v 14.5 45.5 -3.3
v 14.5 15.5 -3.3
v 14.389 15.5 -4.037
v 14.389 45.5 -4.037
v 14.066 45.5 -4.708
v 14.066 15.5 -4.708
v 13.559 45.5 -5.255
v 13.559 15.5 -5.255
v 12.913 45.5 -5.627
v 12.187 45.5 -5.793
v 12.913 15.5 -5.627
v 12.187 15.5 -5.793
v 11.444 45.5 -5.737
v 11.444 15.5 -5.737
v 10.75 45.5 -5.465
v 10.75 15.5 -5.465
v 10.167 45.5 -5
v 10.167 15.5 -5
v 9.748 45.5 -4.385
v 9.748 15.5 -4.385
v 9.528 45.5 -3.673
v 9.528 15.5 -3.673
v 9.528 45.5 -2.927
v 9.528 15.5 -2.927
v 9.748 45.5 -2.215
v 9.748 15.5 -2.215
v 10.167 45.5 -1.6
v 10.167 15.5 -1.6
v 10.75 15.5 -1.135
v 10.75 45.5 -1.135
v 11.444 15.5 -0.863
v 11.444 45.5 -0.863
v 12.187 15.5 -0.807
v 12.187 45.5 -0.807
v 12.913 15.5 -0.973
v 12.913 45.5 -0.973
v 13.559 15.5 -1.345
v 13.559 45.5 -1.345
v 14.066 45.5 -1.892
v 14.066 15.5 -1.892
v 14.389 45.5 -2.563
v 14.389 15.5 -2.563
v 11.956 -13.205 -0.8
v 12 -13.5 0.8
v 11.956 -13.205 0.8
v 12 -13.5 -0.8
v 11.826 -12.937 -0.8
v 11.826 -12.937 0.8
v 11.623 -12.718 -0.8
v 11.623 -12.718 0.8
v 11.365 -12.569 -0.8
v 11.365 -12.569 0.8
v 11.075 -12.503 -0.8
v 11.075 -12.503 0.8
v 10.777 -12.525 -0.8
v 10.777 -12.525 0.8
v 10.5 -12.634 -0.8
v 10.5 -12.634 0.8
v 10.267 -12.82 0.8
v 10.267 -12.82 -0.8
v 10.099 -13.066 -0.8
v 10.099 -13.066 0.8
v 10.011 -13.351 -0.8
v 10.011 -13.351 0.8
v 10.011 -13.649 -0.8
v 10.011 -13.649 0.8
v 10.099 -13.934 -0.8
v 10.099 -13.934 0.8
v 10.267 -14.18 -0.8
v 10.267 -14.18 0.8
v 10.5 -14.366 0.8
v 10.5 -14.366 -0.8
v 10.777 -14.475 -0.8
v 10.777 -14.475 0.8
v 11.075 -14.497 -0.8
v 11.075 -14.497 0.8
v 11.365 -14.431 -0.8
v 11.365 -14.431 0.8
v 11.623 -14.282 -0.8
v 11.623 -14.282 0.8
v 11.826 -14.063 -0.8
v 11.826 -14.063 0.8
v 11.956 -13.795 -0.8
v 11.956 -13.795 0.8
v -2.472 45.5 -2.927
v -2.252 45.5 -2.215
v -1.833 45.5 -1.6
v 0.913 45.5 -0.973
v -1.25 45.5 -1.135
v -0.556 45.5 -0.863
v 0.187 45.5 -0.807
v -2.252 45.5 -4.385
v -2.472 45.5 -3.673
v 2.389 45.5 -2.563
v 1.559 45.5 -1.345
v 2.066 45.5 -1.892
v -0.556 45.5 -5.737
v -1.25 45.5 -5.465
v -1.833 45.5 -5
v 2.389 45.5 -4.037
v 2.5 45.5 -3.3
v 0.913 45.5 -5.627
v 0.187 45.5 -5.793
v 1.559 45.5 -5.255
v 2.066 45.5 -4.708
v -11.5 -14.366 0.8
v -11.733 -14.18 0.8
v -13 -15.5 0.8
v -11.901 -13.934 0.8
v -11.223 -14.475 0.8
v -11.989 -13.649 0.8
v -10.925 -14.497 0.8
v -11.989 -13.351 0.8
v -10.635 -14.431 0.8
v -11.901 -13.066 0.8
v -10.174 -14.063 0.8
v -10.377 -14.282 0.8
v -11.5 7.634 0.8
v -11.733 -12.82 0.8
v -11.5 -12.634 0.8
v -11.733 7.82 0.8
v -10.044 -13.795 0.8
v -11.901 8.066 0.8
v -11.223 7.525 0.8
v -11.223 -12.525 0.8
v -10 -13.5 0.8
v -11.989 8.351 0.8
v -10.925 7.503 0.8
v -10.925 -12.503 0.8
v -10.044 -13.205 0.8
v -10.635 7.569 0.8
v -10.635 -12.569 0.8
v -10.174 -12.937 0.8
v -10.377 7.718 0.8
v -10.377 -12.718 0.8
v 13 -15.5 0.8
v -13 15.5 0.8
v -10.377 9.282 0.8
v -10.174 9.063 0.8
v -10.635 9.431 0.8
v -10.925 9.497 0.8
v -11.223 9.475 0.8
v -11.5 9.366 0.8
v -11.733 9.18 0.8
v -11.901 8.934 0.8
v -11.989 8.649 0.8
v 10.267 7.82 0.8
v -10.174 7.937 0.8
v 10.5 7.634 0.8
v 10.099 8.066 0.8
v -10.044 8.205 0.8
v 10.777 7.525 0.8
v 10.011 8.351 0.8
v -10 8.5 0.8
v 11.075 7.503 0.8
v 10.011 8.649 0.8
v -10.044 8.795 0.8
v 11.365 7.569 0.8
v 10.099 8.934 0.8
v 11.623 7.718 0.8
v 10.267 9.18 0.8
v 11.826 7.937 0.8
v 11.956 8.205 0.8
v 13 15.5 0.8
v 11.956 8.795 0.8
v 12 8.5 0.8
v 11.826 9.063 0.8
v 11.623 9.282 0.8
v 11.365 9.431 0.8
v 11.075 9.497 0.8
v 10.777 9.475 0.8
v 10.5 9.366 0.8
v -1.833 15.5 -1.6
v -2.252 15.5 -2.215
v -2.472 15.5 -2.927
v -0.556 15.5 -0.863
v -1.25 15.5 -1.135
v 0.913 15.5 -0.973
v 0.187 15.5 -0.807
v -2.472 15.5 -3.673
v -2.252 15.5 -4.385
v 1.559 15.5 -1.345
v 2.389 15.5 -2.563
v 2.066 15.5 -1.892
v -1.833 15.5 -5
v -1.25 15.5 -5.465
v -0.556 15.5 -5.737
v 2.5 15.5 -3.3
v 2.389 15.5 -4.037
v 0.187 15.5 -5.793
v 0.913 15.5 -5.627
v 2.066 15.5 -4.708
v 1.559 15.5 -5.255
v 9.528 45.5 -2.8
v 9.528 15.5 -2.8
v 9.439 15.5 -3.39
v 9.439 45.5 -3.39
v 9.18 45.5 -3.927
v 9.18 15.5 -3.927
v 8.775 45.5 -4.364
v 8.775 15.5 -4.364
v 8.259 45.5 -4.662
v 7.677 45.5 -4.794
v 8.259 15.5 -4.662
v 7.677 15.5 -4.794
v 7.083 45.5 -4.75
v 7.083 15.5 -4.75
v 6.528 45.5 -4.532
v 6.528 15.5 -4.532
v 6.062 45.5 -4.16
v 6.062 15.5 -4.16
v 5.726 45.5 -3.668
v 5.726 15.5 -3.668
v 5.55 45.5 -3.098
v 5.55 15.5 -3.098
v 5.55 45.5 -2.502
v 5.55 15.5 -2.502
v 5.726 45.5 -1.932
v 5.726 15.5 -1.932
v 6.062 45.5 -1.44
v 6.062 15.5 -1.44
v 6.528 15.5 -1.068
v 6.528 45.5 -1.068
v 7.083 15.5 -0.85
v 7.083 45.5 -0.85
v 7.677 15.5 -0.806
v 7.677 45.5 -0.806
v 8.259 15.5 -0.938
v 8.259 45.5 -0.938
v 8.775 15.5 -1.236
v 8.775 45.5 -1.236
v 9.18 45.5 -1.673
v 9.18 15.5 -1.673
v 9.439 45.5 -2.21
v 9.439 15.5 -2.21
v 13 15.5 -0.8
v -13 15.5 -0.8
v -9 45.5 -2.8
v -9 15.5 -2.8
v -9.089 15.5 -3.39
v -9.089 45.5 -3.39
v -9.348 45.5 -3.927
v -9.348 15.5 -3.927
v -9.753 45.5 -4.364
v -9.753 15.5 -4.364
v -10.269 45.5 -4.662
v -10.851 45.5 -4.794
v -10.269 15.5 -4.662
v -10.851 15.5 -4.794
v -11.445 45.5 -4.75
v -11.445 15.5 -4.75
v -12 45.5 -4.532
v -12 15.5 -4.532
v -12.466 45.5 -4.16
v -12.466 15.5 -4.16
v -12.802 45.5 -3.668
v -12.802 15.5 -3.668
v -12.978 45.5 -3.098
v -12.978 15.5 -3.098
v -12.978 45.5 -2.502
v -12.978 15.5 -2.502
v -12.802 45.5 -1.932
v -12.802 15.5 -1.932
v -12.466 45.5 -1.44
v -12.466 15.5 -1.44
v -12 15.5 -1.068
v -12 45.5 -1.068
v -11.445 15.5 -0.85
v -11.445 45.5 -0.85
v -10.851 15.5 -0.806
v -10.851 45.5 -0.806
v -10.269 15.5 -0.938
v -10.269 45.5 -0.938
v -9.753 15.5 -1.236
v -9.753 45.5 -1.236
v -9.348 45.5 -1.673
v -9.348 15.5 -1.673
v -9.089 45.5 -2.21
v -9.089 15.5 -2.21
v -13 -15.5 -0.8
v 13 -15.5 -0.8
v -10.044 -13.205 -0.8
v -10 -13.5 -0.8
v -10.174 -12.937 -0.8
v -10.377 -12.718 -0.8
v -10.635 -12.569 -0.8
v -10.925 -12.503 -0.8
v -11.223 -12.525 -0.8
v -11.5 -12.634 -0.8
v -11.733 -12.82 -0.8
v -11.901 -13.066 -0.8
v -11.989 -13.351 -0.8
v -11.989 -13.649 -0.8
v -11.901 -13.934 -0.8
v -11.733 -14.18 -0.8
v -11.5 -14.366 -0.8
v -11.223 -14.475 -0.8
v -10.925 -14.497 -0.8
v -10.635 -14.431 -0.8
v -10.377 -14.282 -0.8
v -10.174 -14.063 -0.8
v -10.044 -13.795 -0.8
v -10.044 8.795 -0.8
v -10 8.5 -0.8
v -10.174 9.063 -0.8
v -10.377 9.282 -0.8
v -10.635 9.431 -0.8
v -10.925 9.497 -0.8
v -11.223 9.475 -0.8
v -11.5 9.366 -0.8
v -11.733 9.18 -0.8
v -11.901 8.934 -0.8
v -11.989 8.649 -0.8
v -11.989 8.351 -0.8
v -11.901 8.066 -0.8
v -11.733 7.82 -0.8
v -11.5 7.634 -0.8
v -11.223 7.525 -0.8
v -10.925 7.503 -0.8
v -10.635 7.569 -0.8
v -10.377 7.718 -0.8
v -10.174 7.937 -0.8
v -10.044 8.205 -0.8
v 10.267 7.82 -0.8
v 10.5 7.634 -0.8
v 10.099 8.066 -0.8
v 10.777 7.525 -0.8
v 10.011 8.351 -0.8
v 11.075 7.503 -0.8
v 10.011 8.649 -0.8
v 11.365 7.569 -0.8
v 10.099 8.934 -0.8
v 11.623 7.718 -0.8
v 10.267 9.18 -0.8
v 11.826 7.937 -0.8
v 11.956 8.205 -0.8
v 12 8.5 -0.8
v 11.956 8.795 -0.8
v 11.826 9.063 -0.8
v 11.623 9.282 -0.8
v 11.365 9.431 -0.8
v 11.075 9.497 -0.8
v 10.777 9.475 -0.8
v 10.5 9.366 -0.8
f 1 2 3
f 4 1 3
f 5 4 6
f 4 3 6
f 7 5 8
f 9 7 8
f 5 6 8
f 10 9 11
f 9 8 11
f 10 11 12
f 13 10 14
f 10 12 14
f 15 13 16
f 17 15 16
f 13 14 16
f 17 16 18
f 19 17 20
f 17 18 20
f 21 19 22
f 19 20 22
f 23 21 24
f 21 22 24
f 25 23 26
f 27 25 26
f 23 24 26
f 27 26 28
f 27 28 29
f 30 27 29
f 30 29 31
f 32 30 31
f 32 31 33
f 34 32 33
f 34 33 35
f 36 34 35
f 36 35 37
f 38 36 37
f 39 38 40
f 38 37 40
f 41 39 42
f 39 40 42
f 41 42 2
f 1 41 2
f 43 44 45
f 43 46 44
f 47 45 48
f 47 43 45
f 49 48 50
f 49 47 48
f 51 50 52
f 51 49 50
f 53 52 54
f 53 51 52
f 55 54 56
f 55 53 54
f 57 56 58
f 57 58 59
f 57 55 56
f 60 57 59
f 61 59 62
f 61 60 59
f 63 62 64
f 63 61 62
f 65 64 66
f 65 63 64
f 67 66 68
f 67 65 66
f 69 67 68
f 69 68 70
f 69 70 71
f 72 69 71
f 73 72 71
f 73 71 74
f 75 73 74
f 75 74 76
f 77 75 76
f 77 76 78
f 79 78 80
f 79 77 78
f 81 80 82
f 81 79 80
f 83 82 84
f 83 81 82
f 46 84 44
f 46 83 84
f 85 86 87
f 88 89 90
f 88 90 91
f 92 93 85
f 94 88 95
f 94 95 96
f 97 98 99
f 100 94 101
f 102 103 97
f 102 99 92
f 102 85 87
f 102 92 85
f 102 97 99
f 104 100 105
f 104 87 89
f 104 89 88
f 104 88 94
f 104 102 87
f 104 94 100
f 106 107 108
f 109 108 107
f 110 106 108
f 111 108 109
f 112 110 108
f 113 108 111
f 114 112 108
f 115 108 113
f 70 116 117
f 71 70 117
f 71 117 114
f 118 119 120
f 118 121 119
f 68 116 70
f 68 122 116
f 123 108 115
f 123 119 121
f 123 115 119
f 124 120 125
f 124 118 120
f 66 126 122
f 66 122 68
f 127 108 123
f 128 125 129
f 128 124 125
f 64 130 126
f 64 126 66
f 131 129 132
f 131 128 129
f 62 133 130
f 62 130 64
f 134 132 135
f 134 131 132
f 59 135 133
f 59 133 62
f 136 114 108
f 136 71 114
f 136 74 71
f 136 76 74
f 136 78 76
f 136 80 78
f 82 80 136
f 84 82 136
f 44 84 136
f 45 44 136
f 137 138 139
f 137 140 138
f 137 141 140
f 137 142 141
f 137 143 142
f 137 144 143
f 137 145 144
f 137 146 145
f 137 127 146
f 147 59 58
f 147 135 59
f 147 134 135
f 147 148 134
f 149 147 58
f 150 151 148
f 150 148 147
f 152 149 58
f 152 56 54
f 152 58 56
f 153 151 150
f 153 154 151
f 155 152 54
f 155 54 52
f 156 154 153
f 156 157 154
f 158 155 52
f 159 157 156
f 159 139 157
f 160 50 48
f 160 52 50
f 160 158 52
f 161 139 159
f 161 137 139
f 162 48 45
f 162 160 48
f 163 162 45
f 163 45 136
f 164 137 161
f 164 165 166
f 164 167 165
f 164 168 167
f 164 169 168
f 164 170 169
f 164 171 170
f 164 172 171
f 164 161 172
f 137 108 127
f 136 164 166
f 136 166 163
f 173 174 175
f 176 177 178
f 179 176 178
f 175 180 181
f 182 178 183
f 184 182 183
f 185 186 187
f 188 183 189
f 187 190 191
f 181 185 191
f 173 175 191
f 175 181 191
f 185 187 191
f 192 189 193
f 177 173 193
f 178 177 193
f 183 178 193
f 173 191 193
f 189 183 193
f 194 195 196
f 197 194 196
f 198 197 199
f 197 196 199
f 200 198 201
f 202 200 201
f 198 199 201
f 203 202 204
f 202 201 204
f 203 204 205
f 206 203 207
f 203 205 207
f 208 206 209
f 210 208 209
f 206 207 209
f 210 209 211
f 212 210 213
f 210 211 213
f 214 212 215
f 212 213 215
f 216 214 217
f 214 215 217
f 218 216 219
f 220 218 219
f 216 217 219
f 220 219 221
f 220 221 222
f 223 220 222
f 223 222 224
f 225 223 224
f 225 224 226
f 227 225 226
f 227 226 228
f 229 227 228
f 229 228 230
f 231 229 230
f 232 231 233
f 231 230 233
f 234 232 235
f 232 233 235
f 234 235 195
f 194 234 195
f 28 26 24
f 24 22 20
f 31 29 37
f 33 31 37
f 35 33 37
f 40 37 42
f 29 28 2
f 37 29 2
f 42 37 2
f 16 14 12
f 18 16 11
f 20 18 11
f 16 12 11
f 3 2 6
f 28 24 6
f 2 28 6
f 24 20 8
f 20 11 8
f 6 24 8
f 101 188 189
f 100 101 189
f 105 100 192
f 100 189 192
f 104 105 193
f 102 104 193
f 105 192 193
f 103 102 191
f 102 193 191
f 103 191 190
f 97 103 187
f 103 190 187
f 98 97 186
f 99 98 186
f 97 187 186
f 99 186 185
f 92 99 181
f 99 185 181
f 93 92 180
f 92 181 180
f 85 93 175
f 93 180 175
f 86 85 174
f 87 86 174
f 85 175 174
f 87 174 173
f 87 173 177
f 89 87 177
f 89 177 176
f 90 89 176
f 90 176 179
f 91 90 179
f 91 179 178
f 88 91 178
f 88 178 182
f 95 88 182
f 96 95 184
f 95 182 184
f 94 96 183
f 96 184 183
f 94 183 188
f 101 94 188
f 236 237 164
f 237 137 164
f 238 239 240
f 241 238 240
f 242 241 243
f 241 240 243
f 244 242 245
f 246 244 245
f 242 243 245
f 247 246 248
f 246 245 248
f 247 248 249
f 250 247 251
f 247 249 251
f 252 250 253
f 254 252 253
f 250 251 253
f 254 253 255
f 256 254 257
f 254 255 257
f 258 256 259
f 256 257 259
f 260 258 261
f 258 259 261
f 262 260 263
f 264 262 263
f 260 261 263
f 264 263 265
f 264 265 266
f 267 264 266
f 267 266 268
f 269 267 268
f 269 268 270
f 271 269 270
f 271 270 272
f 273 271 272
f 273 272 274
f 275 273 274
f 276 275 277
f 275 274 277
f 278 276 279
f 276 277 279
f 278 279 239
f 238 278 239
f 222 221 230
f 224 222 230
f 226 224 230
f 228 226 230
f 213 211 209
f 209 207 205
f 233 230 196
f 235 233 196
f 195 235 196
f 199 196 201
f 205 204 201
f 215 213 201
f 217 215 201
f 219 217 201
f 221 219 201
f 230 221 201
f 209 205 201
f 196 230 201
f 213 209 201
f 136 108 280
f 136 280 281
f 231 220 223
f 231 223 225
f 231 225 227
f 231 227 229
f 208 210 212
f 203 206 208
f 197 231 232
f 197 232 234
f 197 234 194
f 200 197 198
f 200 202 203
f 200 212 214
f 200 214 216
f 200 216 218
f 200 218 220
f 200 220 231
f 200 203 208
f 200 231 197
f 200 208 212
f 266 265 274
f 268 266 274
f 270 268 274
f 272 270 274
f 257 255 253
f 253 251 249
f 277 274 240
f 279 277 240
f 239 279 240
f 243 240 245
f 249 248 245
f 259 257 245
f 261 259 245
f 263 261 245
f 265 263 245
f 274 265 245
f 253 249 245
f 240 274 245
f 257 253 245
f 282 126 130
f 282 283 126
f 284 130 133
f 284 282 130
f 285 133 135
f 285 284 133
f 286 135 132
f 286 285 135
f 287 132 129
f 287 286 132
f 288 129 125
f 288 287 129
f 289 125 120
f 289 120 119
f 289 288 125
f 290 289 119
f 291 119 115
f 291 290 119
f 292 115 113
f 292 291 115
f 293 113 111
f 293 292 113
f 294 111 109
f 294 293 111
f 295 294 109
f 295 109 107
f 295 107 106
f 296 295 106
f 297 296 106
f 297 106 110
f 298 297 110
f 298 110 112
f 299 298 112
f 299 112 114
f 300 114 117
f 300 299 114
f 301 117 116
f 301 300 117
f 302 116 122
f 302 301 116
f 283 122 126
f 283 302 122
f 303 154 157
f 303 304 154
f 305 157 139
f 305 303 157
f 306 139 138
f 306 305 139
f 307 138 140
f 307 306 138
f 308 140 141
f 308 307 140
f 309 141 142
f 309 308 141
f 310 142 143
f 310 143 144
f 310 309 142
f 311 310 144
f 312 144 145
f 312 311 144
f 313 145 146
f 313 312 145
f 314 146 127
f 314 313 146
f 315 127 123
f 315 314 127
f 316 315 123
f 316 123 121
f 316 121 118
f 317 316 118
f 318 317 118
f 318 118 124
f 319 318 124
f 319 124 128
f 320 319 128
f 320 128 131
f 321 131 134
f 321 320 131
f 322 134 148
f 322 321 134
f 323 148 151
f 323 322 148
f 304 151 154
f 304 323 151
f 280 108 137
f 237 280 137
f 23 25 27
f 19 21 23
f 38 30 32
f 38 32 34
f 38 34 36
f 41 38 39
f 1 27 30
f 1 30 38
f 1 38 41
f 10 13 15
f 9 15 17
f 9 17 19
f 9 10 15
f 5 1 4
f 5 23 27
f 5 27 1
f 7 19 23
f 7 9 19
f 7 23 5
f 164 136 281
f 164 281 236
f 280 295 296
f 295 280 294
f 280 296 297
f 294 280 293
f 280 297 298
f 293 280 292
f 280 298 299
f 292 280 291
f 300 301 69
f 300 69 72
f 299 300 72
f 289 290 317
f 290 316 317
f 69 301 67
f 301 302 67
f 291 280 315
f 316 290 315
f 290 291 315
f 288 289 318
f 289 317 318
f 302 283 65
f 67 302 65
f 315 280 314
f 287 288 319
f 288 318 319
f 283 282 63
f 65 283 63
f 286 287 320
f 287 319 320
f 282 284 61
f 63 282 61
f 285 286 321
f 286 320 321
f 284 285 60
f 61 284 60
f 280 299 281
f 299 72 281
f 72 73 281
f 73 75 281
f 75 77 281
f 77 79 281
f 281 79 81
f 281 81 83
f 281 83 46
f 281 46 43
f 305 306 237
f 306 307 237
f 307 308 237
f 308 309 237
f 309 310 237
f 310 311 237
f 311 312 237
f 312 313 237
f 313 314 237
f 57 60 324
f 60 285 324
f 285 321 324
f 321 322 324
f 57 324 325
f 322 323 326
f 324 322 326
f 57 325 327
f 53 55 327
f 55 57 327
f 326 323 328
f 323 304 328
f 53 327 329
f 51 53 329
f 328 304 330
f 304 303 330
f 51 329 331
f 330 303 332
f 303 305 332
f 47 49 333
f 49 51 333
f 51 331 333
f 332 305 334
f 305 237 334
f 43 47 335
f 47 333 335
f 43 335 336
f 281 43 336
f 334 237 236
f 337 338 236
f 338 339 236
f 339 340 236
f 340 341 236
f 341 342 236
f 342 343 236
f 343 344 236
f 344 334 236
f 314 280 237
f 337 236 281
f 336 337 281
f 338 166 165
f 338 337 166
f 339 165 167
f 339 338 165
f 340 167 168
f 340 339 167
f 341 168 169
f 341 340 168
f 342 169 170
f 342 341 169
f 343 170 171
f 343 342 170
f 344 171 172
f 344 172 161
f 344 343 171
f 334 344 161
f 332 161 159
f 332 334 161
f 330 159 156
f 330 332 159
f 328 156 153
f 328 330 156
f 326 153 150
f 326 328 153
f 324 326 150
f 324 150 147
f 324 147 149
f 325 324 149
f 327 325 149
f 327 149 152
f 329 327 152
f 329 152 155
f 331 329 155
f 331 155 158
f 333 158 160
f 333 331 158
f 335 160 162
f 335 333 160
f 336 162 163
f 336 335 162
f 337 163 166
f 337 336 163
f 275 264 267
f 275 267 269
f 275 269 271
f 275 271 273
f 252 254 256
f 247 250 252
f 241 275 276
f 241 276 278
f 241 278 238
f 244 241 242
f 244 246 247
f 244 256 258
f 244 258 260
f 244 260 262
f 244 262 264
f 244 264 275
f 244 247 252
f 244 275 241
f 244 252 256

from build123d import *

# Parameters (mm, degrees)
SKETCH_1_W        = 26
SKETCH_1_H        = 31
SKETCH_1_R        = 1
EXTRUDE_1_DEPTH   = 0.8
SKETCH_3_R        = 2
EXTRUDE_2_DEPTH   = 30
SKETCH_3_R_2      = 2.5
EXTRUDE_2_2_DEPTH = 30
EXTRUDE_2_3_DEPTH = 30
EXTRUDE_2_4_DEPTH = 30


with BuildPart() as part:
    # Эскиз1 → Бобышка-Вытянуть1 (new body, symmetric)
    with BuildSketch(Plane.XY):
        Rectangle(SKETCH_1_W, SKETCH_1_H)
        with Locations((-11, -13.5)):
            Circle(SKETCH_1_R, mode=Mode.SUBTRACT)
        with Locations((11, -13.5)):
            Circle(SKETCH_1_R, mode=Mode.SUBTRACT)
        with Locations((11, 8.5)):
            Circle(SKETCH_1_R, mode=Mode.SUBTRACT)
        with Locations((-11, 8.5)):
            Circle(SKETCH_1_R, mode=Mode.SUBTRACT)
    extrude(amount=EXTRUDE_1_DEPTH, both=True)


with BuildPart() as body_2:
    # Эскиз3 → Бобышка-Вытянуть2 (new body)
    with BuildSketch(Plane(origin=(0, 15.5, 0), x_dir=(1, 0, 0), z_dir=(0, 1, 0))):
        with Locations((-11, 2.8)):
            Circle(SKETCH_3_R)
    extrude(amount=EXTRUDE_2_DEPTH)


with BuildPart() as body_3:
    # Эскиз3 → Extrude 2 2 (new body)
    with BuildSketch(Plane(origin=(0, 15.5, 0), x_dir=(1, 0, 0), z_dir=(0, 1, 0))):
        with Locations((0, 3.3)):
            Circle(SKETCH_3_R_2)
    extrude(amount=EXTRUDE_2_2_DEPTH)


with BuildPart() as body_4:
    # Эскиз3 → Extrude 2 3 (new body)
    with BuildSketch(Plane(origin=(0, 15.5, 0), x_dir=(1, 0, 0), z_dir=(0, 1, 0))):
        with Locations((7.527864045, 2.8)):
            Circle(SKETCH_3_R)
    extrude(amount=EXTRUDE_2_3_DEPTH)


with BuildPart() as body_5:
    # Эскиз3 → Extrude 2 4 (new body)
    with BuildSketch(Plane(origin=(0, 15.5, 0), x_dir=(1, 0, 0), z_dir=(0, 1, 0))):
        with Locations((12, 3.3)):
            Circle(SKETCH_3_R_2)
    extrude(amount=EXTRUDE_2_4_DEPTH)


solid = Compound([part.part, body_2.part, body_3.part, body_4.part, body_5.part])
